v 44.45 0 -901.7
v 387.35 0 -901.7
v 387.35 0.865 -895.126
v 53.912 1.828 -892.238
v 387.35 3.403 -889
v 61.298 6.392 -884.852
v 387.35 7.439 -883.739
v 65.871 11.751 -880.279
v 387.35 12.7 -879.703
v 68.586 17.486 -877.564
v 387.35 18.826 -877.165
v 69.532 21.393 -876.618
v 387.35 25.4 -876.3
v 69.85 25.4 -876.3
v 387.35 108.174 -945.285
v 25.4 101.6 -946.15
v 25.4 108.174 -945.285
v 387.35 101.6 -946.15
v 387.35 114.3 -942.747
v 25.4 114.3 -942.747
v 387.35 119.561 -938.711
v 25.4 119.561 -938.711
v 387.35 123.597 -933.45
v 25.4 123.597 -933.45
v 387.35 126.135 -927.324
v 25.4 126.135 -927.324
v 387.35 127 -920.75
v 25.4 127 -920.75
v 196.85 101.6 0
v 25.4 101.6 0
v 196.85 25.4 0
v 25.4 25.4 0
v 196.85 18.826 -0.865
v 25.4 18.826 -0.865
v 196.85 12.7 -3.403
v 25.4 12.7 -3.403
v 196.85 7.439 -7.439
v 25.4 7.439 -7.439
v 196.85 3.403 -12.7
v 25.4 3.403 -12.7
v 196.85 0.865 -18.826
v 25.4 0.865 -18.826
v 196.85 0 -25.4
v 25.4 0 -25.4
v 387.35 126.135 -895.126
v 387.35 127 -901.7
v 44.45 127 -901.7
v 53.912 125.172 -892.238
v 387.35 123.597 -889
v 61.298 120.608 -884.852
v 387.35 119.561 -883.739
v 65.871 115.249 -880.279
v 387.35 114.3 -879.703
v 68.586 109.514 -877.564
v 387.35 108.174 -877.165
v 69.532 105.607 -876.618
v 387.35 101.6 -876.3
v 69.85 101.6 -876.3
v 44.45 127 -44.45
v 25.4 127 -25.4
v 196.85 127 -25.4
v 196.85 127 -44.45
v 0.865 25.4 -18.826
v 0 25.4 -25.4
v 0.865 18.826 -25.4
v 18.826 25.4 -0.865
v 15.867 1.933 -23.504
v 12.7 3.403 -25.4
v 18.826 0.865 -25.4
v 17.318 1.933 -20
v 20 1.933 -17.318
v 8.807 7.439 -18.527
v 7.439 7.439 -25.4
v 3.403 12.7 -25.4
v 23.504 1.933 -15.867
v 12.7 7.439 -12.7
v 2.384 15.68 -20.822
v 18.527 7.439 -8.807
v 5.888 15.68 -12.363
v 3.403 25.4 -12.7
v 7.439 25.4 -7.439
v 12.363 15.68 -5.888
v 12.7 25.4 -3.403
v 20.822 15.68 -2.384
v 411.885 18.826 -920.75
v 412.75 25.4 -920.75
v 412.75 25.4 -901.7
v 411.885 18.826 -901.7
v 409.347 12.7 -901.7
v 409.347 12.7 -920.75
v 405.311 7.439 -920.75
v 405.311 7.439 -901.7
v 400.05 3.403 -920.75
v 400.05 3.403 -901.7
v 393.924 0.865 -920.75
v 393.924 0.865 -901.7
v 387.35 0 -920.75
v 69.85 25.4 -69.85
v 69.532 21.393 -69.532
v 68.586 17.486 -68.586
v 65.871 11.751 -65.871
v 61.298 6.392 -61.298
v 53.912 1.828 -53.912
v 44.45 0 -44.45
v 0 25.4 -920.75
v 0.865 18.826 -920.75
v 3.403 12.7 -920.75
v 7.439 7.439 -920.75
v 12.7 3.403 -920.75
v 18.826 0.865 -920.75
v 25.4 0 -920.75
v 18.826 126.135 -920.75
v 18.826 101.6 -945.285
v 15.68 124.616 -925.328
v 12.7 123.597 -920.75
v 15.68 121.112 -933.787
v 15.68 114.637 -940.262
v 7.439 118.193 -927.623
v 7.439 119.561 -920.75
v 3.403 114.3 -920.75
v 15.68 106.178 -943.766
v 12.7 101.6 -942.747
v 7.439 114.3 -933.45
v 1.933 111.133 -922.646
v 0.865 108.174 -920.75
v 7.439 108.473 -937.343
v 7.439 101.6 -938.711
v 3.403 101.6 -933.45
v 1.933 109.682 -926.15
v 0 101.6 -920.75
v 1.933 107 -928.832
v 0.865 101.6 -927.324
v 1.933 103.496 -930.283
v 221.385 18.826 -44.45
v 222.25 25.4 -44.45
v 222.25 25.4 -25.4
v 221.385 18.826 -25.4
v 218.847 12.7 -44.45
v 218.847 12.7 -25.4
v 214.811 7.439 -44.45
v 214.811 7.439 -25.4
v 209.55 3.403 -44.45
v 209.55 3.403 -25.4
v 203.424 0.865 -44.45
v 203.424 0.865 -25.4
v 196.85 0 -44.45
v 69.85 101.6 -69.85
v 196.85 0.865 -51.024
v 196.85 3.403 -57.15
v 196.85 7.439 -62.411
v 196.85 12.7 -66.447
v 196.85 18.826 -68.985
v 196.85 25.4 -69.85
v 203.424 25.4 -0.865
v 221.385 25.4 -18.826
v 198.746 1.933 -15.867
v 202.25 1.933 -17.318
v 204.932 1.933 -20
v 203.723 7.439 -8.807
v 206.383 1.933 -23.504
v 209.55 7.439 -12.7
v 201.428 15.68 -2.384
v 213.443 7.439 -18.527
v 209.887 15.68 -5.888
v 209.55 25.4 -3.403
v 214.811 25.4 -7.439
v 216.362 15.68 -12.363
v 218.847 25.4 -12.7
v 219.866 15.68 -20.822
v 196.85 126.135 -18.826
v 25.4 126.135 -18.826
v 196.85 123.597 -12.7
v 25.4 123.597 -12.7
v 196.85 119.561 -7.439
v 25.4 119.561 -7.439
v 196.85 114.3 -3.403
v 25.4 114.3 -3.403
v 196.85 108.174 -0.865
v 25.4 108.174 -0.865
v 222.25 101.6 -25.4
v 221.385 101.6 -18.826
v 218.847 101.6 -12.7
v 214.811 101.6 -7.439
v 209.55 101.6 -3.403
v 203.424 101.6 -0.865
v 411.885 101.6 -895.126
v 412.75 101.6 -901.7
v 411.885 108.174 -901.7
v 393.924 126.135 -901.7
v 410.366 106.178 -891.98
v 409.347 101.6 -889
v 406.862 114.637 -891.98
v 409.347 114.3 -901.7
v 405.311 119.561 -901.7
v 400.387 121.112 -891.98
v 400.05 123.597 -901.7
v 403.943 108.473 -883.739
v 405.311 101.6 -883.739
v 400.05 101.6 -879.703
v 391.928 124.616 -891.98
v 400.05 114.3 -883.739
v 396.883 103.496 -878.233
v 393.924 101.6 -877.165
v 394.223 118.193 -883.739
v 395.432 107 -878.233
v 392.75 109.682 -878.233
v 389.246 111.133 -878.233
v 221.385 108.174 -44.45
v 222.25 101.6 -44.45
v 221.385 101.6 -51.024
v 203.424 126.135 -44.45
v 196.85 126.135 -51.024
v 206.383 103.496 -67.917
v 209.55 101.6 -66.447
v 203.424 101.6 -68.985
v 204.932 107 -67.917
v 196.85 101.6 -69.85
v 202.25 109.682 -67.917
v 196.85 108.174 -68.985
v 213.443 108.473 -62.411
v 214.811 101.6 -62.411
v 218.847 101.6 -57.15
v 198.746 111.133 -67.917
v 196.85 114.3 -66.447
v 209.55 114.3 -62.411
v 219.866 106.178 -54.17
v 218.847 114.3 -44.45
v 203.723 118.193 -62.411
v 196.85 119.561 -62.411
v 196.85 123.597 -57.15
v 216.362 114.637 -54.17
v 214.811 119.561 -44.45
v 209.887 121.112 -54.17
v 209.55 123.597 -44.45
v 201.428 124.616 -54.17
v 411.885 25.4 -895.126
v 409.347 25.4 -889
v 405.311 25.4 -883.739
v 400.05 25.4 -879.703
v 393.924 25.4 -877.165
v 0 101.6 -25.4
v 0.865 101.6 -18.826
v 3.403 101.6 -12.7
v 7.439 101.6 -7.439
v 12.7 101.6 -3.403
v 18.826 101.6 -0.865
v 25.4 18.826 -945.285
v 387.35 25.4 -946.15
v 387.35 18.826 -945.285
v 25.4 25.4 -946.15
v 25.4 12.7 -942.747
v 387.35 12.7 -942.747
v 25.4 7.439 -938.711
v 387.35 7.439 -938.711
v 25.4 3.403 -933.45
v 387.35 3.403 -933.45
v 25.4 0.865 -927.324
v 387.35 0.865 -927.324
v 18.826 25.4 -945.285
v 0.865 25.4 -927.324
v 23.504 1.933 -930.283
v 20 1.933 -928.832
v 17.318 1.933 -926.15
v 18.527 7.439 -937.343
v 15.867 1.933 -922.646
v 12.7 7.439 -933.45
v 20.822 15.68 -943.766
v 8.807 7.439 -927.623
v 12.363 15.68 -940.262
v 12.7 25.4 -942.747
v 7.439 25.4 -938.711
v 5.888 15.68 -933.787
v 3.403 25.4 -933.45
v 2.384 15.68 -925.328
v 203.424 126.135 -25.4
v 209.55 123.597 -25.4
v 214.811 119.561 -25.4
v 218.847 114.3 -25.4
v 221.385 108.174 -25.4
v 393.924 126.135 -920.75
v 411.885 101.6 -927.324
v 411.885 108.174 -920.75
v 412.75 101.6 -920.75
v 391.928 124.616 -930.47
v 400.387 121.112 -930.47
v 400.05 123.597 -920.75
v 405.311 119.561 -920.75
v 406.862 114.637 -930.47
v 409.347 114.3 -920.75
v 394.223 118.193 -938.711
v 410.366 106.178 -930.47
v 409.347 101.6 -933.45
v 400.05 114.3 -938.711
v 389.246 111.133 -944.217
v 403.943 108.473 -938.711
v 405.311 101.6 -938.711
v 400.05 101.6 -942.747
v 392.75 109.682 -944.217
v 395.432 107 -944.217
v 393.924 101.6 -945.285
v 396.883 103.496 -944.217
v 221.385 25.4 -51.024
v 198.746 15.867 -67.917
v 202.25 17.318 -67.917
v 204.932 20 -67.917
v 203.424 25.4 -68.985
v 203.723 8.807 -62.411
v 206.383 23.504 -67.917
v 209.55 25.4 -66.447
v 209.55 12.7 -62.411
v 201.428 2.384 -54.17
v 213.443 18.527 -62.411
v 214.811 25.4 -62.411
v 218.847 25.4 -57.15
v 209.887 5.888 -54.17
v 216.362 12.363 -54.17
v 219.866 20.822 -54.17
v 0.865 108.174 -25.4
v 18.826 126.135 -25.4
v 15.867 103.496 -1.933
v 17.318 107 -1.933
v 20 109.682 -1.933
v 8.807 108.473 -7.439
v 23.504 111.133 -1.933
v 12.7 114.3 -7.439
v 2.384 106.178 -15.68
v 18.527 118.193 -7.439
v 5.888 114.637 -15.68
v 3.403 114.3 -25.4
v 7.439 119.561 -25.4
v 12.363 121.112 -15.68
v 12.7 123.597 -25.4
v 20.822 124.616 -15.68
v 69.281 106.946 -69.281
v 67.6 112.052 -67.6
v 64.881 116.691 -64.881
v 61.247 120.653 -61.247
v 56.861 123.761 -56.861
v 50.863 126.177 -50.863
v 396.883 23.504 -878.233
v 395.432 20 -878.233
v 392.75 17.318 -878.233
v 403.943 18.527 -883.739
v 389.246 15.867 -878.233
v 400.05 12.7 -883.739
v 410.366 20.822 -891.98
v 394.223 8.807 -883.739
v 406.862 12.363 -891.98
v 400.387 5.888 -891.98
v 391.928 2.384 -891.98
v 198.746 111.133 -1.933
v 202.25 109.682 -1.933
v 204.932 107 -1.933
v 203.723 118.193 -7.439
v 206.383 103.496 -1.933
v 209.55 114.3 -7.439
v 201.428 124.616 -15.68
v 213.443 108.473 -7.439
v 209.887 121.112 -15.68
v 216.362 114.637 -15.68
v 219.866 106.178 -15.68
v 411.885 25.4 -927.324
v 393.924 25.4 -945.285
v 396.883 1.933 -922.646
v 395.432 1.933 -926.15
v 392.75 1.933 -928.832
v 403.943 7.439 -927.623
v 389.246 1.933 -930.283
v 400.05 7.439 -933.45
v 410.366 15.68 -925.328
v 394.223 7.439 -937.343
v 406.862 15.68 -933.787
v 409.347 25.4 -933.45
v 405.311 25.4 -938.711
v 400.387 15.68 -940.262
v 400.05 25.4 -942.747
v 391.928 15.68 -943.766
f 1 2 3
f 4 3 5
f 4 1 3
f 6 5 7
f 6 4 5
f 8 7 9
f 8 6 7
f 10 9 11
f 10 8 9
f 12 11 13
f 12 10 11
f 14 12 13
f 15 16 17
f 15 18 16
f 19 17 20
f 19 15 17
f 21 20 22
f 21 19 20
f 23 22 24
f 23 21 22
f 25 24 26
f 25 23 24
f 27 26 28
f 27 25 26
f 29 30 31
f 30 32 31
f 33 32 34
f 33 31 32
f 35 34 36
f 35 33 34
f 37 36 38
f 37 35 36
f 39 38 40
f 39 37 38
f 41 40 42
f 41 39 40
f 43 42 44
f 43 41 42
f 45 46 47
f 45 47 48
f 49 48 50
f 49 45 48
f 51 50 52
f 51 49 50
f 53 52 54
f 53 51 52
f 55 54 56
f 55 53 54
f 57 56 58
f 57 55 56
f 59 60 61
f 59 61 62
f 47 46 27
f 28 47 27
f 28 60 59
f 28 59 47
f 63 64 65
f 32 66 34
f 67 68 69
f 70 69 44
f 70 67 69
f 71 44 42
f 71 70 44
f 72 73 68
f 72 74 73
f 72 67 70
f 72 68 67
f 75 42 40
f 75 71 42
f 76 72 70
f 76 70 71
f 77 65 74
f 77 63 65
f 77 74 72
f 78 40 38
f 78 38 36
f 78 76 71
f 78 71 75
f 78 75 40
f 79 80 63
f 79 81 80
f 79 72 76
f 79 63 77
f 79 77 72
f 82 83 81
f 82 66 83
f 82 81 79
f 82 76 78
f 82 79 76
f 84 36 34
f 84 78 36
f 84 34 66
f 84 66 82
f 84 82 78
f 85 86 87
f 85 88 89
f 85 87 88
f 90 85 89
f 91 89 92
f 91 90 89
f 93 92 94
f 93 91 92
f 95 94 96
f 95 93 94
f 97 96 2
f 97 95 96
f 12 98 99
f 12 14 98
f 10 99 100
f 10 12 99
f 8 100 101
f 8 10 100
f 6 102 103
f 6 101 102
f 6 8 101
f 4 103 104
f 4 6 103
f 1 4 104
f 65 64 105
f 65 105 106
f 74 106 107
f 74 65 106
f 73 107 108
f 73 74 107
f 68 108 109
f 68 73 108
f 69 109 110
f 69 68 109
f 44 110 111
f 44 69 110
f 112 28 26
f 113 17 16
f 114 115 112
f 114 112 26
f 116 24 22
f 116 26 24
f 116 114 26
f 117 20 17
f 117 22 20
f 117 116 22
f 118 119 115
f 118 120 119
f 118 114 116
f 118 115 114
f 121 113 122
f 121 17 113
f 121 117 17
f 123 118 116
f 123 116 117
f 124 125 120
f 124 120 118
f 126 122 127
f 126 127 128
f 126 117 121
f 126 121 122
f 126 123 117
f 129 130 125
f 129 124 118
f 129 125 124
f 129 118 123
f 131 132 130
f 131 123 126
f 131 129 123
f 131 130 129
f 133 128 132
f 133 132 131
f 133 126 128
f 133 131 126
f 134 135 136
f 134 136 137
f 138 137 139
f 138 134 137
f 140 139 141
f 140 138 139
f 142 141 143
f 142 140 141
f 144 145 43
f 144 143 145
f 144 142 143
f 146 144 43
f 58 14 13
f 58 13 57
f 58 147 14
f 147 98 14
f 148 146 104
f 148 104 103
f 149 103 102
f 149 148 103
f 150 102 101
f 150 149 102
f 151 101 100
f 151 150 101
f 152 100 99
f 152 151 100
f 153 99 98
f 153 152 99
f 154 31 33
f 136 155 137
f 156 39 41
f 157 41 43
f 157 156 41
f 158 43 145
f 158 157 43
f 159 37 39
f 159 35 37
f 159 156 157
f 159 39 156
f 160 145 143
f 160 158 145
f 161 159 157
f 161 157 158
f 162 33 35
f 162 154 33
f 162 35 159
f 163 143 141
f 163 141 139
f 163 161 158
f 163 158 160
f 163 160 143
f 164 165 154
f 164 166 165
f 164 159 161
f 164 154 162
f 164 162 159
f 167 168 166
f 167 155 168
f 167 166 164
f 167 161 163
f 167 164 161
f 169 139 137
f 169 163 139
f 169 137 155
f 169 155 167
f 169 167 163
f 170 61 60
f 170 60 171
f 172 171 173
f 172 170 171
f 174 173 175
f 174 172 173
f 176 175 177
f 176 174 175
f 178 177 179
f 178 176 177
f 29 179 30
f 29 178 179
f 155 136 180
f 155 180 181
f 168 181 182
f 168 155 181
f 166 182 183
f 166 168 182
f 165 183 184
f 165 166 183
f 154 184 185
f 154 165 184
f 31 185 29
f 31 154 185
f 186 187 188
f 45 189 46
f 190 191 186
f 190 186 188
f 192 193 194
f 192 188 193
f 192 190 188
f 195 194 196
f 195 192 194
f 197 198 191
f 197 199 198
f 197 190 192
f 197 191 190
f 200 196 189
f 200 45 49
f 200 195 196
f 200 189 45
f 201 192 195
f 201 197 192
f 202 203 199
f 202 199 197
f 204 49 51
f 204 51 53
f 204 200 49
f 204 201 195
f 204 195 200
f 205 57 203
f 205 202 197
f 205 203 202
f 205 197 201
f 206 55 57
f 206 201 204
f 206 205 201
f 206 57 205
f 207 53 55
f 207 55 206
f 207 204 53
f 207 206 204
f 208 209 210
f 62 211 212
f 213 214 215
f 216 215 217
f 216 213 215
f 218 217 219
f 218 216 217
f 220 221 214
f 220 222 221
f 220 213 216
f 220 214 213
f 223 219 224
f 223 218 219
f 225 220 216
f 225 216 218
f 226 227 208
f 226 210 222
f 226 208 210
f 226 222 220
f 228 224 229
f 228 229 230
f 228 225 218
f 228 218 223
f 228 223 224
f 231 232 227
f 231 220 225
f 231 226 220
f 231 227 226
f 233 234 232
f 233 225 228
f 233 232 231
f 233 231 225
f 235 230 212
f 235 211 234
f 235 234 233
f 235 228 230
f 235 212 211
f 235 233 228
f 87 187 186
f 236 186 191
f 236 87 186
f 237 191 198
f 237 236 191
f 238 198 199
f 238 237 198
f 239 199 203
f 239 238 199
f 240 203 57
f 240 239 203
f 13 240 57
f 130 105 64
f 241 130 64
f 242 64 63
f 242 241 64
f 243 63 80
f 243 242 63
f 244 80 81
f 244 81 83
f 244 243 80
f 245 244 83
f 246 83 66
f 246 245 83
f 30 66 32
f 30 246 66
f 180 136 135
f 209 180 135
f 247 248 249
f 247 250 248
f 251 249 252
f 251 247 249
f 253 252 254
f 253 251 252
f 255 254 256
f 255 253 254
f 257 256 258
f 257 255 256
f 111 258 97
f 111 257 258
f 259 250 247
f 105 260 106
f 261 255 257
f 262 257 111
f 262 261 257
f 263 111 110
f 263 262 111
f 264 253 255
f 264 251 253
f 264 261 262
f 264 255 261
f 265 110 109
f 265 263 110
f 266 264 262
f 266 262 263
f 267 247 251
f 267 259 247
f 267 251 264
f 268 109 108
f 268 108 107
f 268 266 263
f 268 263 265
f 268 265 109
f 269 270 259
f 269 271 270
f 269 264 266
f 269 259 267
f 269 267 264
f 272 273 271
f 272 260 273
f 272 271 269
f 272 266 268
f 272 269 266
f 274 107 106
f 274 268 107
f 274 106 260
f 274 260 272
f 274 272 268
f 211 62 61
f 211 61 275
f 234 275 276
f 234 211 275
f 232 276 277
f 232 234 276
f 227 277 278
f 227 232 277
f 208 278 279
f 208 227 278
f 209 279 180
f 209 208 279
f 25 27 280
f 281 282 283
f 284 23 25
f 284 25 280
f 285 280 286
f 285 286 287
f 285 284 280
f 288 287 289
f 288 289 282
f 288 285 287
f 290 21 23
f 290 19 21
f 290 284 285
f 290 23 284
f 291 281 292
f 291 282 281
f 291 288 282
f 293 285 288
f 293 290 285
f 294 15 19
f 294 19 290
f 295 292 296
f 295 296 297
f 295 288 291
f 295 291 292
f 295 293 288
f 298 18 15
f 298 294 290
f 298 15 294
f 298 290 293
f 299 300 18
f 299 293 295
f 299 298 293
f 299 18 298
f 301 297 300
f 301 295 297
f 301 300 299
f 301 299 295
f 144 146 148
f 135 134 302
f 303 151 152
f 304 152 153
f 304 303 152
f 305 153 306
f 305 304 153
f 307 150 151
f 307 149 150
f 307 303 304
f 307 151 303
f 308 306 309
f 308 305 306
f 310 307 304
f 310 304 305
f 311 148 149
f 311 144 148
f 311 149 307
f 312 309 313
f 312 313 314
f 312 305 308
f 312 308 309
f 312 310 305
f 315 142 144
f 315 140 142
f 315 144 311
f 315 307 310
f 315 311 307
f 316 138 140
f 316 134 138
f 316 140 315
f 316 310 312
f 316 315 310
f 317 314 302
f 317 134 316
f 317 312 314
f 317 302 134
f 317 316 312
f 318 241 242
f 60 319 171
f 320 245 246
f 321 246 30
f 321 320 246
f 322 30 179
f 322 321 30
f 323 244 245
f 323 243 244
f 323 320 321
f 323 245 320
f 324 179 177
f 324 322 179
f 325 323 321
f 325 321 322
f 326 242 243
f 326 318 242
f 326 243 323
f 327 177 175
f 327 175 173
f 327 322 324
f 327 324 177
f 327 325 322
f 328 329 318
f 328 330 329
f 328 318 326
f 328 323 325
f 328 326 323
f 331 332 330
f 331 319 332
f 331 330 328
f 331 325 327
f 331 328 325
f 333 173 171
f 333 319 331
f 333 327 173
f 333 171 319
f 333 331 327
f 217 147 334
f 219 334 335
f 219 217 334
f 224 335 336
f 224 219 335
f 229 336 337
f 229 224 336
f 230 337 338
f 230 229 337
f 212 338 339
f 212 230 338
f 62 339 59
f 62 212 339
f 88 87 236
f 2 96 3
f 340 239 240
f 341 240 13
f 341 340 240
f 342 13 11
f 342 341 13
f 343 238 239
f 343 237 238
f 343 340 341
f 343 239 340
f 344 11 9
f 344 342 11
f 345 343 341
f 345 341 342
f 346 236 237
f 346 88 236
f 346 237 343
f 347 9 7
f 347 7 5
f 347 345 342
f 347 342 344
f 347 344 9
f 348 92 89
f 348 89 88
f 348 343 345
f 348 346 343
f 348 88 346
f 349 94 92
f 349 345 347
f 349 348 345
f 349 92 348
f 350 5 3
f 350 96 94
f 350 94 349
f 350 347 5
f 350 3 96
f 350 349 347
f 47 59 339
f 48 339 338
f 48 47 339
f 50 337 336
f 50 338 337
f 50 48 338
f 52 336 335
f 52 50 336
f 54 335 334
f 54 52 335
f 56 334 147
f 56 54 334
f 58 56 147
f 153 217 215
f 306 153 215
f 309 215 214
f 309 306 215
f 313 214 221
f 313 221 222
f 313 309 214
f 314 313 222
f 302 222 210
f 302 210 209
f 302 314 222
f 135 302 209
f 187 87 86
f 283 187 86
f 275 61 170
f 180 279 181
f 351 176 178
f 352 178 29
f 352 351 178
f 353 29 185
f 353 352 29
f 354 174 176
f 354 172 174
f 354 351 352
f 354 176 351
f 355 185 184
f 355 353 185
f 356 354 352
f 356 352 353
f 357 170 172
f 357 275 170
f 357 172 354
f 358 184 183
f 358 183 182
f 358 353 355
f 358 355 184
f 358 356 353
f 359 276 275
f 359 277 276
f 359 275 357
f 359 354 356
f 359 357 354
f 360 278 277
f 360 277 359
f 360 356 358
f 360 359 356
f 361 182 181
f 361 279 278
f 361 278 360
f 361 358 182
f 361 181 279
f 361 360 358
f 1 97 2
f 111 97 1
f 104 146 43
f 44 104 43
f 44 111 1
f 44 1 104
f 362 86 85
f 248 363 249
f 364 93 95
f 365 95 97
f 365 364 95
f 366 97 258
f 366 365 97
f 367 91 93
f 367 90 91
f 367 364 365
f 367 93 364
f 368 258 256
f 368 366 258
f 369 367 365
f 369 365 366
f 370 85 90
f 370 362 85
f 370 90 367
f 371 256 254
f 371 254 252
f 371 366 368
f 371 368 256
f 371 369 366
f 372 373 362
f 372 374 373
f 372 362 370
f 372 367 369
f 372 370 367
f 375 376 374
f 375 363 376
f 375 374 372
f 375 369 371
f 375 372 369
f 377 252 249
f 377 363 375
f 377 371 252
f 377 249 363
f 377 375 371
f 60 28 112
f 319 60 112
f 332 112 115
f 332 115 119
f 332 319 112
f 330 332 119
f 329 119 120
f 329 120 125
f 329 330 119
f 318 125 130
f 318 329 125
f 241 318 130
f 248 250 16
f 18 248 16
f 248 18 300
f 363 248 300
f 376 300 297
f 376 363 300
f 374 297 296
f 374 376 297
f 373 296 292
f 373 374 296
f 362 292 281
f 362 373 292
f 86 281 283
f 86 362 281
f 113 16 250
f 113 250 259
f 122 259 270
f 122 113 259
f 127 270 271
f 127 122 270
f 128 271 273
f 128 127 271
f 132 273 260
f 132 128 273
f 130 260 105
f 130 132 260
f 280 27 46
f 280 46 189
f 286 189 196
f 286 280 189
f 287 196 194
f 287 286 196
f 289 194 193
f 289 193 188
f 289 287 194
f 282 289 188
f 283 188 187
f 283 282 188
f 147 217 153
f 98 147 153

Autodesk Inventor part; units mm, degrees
ref_plane "YZ Plane" through (0, 0, 0) normal (1, 0, 0) x (0, 1, 0)
ref_plane "XZ Plane" through (0, 0, 0) normal (0, 1, 0) x (-1, 0, 0)
ref_plane "XY Plane" through (0, 0, 0) normal (0, 0, 1) x (1, 0, 0)
sketch "Sketch1" plane through (0, 0, 0) normal (0, 1, 0) x (-1, 0, 0)
  line L0 (0, 0) -> (-69.85, 0)
  line L1 (-69.85, 0) -> (-69.85, -946.15)
  line L2 (-69.85, -946.15) -> (0, -946.15)
  line L3 (0, -946.15) -> (0, 0)
  dimension "d0" = 946.15
  dimension "d1" = 69.85
extrude "Extrusion1" add sketch "Sketch1" along normal blind 127
sketch "Sketch2" plane through (69.85, 0, 0) normal (1, 0, 0) x (0, 0, -1)
  line L0 (0, 127) -> (69.85, 127)
  line L1 (69.85, 127) -> (69.85, 0)
  line L2 (69.85, 0) -> (0, 0)
  line L3 (0, 0) -> (0, 127)
  point P0 (946.15, 127)
  dimension "d4" = 69.85
extrude "Extrusion2" add sketch "Sketch2" along normal blind 152.4
sketch "Sketch3" plane through (69.85, 0, -946.15) normal (1, 0, 0) x (0, 0, -1)
  line L0 (0, 0) -> (0, 127) projected
  line L1 (-876.3, 127) -> (0, 127) projected
  line L2 (0, 0) -> (-69.85, 0)
  line L3 (-69.85, 0) -> (-69.85, 127)
  line L4 (-69.85, 127) -> (0, 127)
  line L5 (0, 127) -> (0, 0)
  point P0 (-946.15, 0)
  dimension "d8" = 69.85
extrude "Extrusion3" add sketch "Sketch3" along normal blind 342.9
fillet "Fillet1" radius 25.4 1 edges at (222.25, 127, -34.925)
fillet "Fillet2" radius 25.4 1 edges at (412.75, 127, -911.225)
fillet "Fillet6" radius 25.4 3 edges at (193.675, 127, -946.15) (405.3105, 119.5605, -946.15) (412.75, 50.8, -946.15)
fillet "Fillet7" radius 25.4 3 edges at (0, 127, -460.375) (0, 119.5605, -938.7105) (0, 50.8, -946.15)
fillet "Fillet8" radius 25.4 5 edges at (214.8105, 119.5605, 0) (222.25, 50.8, 0) (7.4395, 119.5605, 0) (0, 50.8, 0) (111.125, 127, 0)
sketch "Sketch4" plane through (412.75, 0, -946.15) normal (1, 0, 0) x (0, 0, -1)
  line L0 (-25.4, 101.6) -> (-25.4, 0) projected
  line L1 (-69.85, 101.6) -> (-25.4, 101.6) projected
  line L2 (-25.4, 0) -> (-69.85, 0)
  line L3 (-69.85, 0) -> (-69.85, 101.6)
  line L4 (-69.85, 101.6) -> (-25.4, 101.6)
  line L5 (-25.4, 101.6) -> (-25.4, 0)
  point P0 (-946.15, 0)
extrude "Extrusion4" add sketch "Sketch4" along normal blind 12.7
sketch "Sketch5" plane through (425.45, 0, -946.15) normal (1, 0, 0) x (0, 0, -1)
  line L0 (-69.85, 101.6) -> (-69.85, 0) projected
  line L1 (-69.85, 101.6) -> (-25.4, 101.6)
  line L2 (-25.4, 101.6) -> (-25.4, 0)
  line L3 (-25.4, 0) -> (-69.85, 0)
  line L4 (-69.85, 0) -> (-69.85, 101.6)
  point P0 (-946.15, 0)
extrude "Extrusion5" cut sketch "Sketch5" against normal blind 12.7
fillet "Fillet9" radius 25.4 19 edges at (214.8105, 0, -7.4395) (222.25, 0, -47.625) (7.4395, 0, -7.4395) (0, 0, -473.075) (7.4395, 0, -938.7105) (206.375, 0, -946.15) (405.3105, 0, -938.7105) (412.75, 0, -898.525) (111.125, 0, 0) (146.05, 0, -69.85) (69.85, 0, -473.075) (241.3, 0, -876.3) (405.3105, 119.5605, -876.3) (228.6, 127, -876.3) (412.75, 50.8, -876.3) (214.8105, 119.5605, -69.85) (133.35, 127, -69.85) (222.25, 50.8, -69.85) (69.85, 127, -473.075)
equation "\"BendRadius\" = Thickness"
equation "\"BendReliefWidth\" = Thickness"
equation "\"BendReliefDepth\" = 0.5 * Thickness"
equation "\"CornerReliefSize\" = 4 * Thickness"
equation "\"MinimumRemnant\" = 2 * Thickness"
equation "\"TransitionRadius\" = BendRadius"
equation "\"JacobiRadiusSize\" = BendRadius"
equation "\"GapSize\" = Thickness"
equation "\"Thickness\" = 3.048"
properties part number "Bumpers_2020"
